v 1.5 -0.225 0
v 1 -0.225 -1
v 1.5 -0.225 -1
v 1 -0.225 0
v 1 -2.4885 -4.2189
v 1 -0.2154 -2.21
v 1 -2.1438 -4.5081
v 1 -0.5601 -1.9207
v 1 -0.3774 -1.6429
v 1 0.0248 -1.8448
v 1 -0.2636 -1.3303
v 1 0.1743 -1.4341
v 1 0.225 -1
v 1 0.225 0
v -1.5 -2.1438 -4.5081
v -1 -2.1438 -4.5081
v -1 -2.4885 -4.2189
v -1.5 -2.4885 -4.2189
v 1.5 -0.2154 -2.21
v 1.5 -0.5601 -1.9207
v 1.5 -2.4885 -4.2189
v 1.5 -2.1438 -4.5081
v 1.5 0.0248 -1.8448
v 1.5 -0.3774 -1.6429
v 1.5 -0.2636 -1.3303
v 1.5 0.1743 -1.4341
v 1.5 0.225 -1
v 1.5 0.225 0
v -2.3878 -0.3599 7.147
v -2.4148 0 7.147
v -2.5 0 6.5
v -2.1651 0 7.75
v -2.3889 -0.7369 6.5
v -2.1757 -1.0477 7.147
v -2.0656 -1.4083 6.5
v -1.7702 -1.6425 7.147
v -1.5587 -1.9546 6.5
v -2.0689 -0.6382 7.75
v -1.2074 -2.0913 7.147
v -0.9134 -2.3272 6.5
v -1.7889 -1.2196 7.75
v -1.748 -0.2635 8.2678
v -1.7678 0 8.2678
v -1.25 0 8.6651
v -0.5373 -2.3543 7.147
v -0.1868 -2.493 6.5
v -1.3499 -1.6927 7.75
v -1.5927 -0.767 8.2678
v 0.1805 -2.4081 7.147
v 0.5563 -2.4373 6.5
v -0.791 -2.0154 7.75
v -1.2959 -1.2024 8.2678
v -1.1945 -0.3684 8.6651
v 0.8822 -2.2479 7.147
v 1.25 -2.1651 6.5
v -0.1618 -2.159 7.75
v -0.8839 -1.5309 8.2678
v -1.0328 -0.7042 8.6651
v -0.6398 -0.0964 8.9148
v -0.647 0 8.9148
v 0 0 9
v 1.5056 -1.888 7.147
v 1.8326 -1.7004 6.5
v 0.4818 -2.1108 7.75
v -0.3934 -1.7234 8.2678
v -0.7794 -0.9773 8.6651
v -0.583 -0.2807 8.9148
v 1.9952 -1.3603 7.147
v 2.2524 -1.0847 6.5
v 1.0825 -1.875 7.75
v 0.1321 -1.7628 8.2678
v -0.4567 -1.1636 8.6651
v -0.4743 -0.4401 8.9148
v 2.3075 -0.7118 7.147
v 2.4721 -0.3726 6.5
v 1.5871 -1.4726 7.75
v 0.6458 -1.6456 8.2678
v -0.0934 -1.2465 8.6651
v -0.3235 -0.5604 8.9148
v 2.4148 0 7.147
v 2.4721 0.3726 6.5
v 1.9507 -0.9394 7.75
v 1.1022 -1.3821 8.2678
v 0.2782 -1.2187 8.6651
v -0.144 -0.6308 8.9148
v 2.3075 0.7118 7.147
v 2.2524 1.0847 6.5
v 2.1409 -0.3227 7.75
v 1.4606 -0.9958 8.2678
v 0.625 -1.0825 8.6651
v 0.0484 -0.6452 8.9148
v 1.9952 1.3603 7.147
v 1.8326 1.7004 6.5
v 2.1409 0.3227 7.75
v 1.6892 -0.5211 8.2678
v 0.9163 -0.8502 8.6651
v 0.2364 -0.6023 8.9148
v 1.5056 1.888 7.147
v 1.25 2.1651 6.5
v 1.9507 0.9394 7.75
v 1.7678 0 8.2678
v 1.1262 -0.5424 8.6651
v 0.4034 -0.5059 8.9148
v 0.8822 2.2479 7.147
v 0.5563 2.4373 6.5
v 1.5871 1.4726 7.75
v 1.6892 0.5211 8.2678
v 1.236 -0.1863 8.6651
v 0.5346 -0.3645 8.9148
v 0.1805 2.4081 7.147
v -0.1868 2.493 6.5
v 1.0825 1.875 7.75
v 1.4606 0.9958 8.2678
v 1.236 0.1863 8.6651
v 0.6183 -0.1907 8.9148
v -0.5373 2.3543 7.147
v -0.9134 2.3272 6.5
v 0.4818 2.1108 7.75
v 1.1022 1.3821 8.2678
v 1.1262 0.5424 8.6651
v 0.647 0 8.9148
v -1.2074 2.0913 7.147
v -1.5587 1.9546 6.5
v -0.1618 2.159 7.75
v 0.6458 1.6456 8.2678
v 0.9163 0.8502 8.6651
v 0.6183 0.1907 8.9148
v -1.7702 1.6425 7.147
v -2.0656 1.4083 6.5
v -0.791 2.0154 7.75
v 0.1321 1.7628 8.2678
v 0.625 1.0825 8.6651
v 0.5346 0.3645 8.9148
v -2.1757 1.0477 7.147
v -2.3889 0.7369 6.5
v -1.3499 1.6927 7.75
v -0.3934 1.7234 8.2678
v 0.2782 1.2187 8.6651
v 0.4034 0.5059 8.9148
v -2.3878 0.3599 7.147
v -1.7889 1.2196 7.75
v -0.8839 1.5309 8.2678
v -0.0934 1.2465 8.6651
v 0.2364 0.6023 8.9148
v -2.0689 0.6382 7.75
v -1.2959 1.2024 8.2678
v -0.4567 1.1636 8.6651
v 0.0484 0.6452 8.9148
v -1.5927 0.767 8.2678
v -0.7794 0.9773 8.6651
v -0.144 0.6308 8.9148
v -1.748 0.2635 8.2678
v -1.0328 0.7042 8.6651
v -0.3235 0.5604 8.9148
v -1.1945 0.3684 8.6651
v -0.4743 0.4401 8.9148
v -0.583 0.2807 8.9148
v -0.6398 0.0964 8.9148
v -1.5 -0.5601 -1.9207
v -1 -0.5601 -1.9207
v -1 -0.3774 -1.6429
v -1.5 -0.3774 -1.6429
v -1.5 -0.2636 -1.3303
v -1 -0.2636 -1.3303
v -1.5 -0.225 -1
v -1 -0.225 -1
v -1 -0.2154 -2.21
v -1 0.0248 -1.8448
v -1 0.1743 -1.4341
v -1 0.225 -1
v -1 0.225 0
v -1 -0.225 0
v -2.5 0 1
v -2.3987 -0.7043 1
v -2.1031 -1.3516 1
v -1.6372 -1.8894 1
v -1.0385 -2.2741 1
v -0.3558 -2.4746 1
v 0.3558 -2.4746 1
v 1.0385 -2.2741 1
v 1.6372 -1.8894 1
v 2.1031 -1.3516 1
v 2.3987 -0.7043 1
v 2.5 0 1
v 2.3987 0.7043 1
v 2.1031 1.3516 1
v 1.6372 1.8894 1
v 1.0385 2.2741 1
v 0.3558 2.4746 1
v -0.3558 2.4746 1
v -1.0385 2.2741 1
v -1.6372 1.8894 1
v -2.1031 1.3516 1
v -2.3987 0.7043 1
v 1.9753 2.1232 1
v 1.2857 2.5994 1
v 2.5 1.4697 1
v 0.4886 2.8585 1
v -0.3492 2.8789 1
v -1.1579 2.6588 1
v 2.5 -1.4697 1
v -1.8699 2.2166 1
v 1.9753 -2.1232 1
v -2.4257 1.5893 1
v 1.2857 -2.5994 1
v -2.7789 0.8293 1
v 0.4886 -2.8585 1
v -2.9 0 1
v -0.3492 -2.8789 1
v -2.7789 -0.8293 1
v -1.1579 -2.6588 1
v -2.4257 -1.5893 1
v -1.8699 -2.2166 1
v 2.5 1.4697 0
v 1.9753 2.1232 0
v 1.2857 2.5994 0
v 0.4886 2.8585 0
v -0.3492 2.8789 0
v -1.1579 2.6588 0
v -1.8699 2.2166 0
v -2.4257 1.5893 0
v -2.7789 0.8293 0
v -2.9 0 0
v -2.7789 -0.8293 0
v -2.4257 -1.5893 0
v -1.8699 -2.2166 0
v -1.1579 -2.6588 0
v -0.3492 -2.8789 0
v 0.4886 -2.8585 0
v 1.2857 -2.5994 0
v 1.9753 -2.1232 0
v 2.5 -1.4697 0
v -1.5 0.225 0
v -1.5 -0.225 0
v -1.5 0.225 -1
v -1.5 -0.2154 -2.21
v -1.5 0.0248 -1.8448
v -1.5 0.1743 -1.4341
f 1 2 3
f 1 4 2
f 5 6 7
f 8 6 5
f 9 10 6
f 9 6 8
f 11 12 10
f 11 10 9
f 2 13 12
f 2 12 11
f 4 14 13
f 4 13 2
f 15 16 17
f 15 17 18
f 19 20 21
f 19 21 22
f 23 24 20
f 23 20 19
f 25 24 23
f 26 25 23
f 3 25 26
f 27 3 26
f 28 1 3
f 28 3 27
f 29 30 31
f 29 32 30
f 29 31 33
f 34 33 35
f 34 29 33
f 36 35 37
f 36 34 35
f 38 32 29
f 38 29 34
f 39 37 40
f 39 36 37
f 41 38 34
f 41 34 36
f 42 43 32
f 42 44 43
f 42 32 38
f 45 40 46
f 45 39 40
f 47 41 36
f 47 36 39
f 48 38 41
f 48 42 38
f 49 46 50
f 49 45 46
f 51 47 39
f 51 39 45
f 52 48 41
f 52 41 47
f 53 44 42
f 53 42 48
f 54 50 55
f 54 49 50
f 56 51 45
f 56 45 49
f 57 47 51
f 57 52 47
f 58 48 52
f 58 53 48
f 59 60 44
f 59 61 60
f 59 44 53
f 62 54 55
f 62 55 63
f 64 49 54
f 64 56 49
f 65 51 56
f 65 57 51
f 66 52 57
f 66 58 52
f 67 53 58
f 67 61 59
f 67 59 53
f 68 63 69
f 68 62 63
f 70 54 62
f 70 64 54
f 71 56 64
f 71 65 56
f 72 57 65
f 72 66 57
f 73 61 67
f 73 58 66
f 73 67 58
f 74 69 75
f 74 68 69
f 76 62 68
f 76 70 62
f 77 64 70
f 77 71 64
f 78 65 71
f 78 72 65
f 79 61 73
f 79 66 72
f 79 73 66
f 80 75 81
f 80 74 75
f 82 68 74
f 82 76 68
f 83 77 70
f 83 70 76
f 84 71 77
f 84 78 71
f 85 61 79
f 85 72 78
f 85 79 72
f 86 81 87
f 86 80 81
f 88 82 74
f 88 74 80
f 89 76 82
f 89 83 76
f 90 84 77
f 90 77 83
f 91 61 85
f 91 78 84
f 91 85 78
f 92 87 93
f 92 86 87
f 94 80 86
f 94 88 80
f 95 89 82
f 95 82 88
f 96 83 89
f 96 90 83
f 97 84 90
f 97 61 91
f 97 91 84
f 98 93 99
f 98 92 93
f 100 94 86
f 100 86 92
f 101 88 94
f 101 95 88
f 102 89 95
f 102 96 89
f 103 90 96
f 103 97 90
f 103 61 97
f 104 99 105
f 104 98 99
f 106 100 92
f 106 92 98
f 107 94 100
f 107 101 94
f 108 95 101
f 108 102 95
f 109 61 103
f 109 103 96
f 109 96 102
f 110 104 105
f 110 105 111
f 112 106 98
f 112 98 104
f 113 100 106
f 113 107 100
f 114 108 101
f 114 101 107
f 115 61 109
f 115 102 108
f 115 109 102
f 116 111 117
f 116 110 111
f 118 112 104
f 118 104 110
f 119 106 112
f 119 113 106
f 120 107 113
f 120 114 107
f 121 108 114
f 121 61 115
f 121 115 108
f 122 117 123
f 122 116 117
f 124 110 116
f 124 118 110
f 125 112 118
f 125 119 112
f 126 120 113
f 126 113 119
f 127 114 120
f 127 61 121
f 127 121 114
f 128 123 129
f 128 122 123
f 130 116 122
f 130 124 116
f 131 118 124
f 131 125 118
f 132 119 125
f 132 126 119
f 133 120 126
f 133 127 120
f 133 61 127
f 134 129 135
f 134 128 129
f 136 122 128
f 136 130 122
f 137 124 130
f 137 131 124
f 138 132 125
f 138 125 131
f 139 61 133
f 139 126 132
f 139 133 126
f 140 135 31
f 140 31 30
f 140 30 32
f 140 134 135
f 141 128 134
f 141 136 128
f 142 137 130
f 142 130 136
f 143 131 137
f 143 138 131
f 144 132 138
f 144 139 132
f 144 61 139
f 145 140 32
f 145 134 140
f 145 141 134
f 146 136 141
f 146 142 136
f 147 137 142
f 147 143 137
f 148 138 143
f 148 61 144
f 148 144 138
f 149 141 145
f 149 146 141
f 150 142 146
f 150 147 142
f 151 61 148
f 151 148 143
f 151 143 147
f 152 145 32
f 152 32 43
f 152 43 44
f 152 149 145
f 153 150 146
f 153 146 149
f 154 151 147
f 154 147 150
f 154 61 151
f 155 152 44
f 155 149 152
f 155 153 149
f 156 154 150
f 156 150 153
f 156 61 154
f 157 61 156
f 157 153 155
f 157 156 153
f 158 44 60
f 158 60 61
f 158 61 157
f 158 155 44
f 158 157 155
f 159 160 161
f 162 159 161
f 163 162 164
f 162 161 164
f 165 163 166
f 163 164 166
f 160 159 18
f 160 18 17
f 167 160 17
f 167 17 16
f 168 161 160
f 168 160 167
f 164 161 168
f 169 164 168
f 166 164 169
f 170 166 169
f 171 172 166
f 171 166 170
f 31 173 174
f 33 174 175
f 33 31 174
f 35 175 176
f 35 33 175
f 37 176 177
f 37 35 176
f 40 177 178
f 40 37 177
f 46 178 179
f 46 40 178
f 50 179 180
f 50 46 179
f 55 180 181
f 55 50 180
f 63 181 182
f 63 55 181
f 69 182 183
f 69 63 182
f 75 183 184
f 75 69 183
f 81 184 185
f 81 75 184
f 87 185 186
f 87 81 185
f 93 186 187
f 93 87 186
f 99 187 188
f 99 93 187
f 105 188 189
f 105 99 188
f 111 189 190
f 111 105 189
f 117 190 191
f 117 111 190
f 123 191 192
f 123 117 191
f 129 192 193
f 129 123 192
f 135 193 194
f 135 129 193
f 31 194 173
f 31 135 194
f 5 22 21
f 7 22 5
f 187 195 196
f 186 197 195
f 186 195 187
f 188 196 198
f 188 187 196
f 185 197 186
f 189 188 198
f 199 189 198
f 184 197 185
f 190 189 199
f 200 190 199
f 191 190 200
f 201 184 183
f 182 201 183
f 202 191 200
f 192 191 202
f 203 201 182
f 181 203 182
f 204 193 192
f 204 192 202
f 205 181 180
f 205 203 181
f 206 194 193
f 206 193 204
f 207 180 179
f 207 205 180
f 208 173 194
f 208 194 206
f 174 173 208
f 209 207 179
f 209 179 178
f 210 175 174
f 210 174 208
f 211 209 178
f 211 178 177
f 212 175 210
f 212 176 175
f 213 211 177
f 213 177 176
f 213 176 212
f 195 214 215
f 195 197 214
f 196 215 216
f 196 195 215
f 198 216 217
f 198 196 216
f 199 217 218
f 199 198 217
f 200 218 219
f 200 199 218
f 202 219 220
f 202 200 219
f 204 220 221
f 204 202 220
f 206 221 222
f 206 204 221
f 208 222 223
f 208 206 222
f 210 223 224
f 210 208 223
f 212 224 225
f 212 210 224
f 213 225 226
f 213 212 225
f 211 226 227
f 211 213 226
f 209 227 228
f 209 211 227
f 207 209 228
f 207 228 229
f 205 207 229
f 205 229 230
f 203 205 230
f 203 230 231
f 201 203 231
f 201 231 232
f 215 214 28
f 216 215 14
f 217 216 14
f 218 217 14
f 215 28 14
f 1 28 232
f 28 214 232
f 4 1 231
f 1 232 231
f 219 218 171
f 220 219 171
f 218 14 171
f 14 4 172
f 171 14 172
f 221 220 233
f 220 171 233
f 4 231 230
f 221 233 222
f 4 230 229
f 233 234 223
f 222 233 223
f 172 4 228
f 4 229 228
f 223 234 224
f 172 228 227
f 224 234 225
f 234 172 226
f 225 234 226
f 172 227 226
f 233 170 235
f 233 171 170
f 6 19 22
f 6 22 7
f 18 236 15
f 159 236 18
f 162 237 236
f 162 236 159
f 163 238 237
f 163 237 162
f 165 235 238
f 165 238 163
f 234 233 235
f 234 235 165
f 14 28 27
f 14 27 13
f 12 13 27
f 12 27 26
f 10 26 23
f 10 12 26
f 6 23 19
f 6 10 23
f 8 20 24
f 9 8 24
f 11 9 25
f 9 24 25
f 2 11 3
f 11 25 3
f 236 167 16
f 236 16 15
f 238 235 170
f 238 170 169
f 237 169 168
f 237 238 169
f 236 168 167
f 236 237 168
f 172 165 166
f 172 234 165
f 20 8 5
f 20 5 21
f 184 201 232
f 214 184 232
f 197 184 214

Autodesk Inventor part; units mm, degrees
ref_plane "XZ Plane" through (0, 0, 0) normal (0, 1, 0) x (-1, 0, 0)
ref_plane "XY Plane" through (0, 0, 0) normal (0, 0, 1) x (1, 0, 0)
sketch "Skizze1" plane through (0, 0, 0) normal (0, 1, 0) x (-1, 0, 0)
  line L0 (0, 0) -> (0, 9)
  line L1 (0, 0) -> (2.9, 0)
  line L2 (2.9, 0) -> (2.9, 1)
  line L3 (2.9, 1) -> (2.5, 1)
  line L4 (2.5, 1) -> (2.5, 6.5)
  arc A0 (2.5, 6.5) -> (0, 9) centre (0, 6.5) ccw
  dimension "d0" = 5.8
  dimension "d2" = 5
  dimension "d3" = 9
  dimension "d4" = 1
revolve "Umdrehung1" add sketch "Skizze1" angle 360 about axis through (0, 0, 0) along (0, 0, 1)
ref_plane "Arbeitsebene2" through (2.5, 0, 3.75) normal (1, 0, 0) x (0, 1, 0)
sketch "Skizze2" plane through (2.5, 0, 3.75) normal (1, 0, 0) x (0, 1, 0)
  line L0 (-2.9, -3.75) -> (2.9, -3.75) projected
  line L1 (-2.9, -2.75) -> (2.9, -2.75) projected
  line L2 (-2.9, -2.75) -> (2.9, -2.75)
  line L3 (2.9, -2.75) -> (2.9, -3.75)
  line L4 (2.9, -3.75) -> (-2.9, -3.75)
  line L5 (-2.9, -3.75) -> (-2.9, -2.75)
  point P0 (0, -3.75)
extrude "Extrusion1" cut sketch "Skizze2" along normal blind 1
sketch "Skizze3" plane through (0, 0, 0) normal (0, 0, -1) x (-1, 0, 0)
  line L0 (-1.5, 0.225) -> (-1, 0.225)
  line L1 (-1, 0.225) -> (-1, -0.225)
  line L2 (-1, -0.225) -> (-1.5, -0.225)
  line L3 (-1.5, -0.225) -> (-1.5, 0.225)
  line L4 (1, 0.225) -> (1.5, 0.225)
  line L5 (1.5, 0.225) -> (1.5, -0.225)
  line L6 (1.5, -0.225) -> (1, -0.225)
  line L7 (1, -0.225) -> (1, 0.225)
  line L8 (0, -4.06) -> (0, 4.06) projected
  line L9 (-3.58, 0) -> (3.98, 0) projected
  point P0 (0, 0)
  dimension "d8" = 0.5
  dimension "d10" = 0.45
  dimension "d11" = 3
extrude "Extrusion2" add sketch "Skizze3" along normal blind 5
sketch "Skizze4" plane through (1, -0.225, 0) normal (0, -1, 0) x (1, 0, 0)
  line L0 (1.4937, -1) -> (-4.2917, -1)
  line L1 (-3.9, 0) -> (1.5, 0) projected
  point P0 (-1, 0)
  dimension "d14" = 1
bend part "Biegungsteil1" radius 1.4324 angle 40 line through (2.4937, -0.225, -1) along (-1, 0, 0) centre toward (0, -1, 0) moving side (0, 0, -1) both sides no
properties part number "LED 5mm" material "PC/ABS-Kunststoff"
